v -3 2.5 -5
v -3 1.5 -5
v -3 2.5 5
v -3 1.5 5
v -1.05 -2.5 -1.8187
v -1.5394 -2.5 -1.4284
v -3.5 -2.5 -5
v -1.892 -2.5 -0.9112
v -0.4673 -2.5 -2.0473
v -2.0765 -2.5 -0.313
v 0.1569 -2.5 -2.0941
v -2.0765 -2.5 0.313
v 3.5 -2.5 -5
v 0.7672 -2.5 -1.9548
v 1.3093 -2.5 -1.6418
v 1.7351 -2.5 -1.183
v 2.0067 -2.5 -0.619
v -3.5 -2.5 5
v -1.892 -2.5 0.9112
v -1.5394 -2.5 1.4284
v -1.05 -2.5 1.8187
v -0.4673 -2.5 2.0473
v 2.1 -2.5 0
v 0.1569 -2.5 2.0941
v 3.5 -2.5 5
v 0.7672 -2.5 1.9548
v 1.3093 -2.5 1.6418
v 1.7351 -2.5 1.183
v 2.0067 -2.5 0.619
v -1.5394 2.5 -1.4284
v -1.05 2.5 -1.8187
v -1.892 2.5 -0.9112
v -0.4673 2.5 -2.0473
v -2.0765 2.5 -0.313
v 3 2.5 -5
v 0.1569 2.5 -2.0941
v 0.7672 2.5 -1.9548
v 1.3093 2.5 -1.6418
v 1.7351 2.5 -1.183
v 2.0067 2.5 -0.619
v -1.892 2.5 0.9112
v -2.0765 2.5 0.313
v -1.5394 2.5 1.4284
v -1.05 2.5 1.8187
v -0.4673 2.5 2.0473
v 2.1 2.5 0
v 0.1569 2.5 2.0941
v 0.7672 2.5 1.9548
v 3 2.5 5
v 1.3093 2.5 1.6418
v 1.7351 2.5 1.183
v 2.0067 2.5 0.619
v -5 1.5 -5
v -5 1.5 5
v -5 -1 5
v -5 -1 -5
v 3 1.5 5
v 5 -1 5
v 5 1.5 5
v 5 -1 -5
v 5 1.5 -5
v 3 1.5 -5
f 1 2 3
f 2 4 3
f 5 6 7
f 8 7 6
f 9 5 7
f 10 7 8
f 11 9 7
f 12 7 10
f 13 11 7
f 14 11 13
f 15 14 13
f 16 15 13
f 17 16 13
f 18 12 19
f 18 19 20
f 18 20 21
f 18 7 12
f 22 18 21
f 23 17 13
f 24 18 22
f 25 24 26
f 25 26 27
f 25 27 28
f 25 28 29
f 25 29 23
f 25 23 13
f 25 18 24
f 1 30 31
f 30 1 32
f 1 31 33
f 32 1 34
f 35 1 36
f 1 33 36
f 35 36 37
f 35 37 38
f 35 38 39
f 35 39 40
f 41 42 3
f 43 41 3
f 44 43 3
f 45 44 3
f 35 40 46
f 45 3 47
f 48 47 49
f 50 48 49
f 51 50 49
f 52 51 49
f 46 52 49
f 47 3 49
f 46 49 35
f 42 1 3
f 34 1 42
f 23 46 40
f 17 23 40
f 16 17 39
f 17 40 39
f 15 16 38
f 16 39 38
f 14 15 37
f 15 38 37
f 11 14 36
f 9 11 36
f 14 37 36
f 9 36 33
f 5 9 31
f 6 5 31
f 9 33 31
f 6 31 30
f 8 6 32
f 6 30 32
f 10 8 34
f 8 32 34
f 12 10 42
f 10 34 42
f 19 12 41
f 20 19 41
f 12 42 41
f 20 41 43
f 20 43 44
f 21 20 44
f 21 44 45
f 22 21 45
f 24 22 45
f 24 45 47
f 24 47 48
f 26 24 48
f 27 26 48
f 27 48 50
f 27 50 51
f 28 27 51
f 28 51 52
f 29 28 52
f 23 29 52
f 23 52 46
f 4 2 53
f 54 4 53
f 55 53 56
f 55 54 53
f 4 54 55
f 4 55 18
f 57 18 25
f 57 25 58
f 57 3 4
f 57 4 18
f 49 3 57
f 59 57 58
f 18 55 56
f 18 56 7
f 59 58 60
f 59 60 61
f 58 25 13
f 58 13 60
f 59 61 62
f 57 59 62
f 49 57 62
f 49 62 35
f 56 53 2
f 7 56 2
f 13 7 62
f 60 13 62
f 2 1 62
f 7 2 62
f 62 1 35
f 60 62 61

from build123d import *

# Parameters (mm, degrees)
SKETCH1_W           = 6
SKETCH1_H           = 4
SKETCH1_H_2         = 1
BOSS_EXTRUDE1_DEPTH = 5
SKETCH2_R           = 2.1
CUT_EXTRUDE1_DEPTH  = 6


with BuildPart() as part:
    # Sketch1 → Boss-Extrude1 (new body, symmetric)
    with BuildSketch(Plane.XY):
        Polygon((-5, 1.5), (-5, -1), (-3.5, -2.5), (-3, -2.5), (-3, 1.5), align=None)
        with Locations((0, -0.5)):
            Rectangle(SKETCH1_W, SKETCH1_H)
        with Locations((0, 2)):
            Rectangle(SKETCH1_W, SKETCH1_H_2)
        Polygon((3, 1.5), (3, -2.5), (3.5, -2.5), (5, -1), (5, 1.5), align=None)
    extrude(amount=BOSS_EXTRUDE1_DEPTH, both=True)

    # Sketch2 → Cut-Extrude1 (cut, through all)
    with BuildSketch(Plane(origin=(0, 2.5, 0), x_dir=(1, 0, 0), z_dir=(0, 1, 0))):
        Circle(SKETCH2_R)
    extrude(amount=-CUT_EXTRUDE1_DEPTH, mode=Mode.SUBTRACT)


solid = part.part
